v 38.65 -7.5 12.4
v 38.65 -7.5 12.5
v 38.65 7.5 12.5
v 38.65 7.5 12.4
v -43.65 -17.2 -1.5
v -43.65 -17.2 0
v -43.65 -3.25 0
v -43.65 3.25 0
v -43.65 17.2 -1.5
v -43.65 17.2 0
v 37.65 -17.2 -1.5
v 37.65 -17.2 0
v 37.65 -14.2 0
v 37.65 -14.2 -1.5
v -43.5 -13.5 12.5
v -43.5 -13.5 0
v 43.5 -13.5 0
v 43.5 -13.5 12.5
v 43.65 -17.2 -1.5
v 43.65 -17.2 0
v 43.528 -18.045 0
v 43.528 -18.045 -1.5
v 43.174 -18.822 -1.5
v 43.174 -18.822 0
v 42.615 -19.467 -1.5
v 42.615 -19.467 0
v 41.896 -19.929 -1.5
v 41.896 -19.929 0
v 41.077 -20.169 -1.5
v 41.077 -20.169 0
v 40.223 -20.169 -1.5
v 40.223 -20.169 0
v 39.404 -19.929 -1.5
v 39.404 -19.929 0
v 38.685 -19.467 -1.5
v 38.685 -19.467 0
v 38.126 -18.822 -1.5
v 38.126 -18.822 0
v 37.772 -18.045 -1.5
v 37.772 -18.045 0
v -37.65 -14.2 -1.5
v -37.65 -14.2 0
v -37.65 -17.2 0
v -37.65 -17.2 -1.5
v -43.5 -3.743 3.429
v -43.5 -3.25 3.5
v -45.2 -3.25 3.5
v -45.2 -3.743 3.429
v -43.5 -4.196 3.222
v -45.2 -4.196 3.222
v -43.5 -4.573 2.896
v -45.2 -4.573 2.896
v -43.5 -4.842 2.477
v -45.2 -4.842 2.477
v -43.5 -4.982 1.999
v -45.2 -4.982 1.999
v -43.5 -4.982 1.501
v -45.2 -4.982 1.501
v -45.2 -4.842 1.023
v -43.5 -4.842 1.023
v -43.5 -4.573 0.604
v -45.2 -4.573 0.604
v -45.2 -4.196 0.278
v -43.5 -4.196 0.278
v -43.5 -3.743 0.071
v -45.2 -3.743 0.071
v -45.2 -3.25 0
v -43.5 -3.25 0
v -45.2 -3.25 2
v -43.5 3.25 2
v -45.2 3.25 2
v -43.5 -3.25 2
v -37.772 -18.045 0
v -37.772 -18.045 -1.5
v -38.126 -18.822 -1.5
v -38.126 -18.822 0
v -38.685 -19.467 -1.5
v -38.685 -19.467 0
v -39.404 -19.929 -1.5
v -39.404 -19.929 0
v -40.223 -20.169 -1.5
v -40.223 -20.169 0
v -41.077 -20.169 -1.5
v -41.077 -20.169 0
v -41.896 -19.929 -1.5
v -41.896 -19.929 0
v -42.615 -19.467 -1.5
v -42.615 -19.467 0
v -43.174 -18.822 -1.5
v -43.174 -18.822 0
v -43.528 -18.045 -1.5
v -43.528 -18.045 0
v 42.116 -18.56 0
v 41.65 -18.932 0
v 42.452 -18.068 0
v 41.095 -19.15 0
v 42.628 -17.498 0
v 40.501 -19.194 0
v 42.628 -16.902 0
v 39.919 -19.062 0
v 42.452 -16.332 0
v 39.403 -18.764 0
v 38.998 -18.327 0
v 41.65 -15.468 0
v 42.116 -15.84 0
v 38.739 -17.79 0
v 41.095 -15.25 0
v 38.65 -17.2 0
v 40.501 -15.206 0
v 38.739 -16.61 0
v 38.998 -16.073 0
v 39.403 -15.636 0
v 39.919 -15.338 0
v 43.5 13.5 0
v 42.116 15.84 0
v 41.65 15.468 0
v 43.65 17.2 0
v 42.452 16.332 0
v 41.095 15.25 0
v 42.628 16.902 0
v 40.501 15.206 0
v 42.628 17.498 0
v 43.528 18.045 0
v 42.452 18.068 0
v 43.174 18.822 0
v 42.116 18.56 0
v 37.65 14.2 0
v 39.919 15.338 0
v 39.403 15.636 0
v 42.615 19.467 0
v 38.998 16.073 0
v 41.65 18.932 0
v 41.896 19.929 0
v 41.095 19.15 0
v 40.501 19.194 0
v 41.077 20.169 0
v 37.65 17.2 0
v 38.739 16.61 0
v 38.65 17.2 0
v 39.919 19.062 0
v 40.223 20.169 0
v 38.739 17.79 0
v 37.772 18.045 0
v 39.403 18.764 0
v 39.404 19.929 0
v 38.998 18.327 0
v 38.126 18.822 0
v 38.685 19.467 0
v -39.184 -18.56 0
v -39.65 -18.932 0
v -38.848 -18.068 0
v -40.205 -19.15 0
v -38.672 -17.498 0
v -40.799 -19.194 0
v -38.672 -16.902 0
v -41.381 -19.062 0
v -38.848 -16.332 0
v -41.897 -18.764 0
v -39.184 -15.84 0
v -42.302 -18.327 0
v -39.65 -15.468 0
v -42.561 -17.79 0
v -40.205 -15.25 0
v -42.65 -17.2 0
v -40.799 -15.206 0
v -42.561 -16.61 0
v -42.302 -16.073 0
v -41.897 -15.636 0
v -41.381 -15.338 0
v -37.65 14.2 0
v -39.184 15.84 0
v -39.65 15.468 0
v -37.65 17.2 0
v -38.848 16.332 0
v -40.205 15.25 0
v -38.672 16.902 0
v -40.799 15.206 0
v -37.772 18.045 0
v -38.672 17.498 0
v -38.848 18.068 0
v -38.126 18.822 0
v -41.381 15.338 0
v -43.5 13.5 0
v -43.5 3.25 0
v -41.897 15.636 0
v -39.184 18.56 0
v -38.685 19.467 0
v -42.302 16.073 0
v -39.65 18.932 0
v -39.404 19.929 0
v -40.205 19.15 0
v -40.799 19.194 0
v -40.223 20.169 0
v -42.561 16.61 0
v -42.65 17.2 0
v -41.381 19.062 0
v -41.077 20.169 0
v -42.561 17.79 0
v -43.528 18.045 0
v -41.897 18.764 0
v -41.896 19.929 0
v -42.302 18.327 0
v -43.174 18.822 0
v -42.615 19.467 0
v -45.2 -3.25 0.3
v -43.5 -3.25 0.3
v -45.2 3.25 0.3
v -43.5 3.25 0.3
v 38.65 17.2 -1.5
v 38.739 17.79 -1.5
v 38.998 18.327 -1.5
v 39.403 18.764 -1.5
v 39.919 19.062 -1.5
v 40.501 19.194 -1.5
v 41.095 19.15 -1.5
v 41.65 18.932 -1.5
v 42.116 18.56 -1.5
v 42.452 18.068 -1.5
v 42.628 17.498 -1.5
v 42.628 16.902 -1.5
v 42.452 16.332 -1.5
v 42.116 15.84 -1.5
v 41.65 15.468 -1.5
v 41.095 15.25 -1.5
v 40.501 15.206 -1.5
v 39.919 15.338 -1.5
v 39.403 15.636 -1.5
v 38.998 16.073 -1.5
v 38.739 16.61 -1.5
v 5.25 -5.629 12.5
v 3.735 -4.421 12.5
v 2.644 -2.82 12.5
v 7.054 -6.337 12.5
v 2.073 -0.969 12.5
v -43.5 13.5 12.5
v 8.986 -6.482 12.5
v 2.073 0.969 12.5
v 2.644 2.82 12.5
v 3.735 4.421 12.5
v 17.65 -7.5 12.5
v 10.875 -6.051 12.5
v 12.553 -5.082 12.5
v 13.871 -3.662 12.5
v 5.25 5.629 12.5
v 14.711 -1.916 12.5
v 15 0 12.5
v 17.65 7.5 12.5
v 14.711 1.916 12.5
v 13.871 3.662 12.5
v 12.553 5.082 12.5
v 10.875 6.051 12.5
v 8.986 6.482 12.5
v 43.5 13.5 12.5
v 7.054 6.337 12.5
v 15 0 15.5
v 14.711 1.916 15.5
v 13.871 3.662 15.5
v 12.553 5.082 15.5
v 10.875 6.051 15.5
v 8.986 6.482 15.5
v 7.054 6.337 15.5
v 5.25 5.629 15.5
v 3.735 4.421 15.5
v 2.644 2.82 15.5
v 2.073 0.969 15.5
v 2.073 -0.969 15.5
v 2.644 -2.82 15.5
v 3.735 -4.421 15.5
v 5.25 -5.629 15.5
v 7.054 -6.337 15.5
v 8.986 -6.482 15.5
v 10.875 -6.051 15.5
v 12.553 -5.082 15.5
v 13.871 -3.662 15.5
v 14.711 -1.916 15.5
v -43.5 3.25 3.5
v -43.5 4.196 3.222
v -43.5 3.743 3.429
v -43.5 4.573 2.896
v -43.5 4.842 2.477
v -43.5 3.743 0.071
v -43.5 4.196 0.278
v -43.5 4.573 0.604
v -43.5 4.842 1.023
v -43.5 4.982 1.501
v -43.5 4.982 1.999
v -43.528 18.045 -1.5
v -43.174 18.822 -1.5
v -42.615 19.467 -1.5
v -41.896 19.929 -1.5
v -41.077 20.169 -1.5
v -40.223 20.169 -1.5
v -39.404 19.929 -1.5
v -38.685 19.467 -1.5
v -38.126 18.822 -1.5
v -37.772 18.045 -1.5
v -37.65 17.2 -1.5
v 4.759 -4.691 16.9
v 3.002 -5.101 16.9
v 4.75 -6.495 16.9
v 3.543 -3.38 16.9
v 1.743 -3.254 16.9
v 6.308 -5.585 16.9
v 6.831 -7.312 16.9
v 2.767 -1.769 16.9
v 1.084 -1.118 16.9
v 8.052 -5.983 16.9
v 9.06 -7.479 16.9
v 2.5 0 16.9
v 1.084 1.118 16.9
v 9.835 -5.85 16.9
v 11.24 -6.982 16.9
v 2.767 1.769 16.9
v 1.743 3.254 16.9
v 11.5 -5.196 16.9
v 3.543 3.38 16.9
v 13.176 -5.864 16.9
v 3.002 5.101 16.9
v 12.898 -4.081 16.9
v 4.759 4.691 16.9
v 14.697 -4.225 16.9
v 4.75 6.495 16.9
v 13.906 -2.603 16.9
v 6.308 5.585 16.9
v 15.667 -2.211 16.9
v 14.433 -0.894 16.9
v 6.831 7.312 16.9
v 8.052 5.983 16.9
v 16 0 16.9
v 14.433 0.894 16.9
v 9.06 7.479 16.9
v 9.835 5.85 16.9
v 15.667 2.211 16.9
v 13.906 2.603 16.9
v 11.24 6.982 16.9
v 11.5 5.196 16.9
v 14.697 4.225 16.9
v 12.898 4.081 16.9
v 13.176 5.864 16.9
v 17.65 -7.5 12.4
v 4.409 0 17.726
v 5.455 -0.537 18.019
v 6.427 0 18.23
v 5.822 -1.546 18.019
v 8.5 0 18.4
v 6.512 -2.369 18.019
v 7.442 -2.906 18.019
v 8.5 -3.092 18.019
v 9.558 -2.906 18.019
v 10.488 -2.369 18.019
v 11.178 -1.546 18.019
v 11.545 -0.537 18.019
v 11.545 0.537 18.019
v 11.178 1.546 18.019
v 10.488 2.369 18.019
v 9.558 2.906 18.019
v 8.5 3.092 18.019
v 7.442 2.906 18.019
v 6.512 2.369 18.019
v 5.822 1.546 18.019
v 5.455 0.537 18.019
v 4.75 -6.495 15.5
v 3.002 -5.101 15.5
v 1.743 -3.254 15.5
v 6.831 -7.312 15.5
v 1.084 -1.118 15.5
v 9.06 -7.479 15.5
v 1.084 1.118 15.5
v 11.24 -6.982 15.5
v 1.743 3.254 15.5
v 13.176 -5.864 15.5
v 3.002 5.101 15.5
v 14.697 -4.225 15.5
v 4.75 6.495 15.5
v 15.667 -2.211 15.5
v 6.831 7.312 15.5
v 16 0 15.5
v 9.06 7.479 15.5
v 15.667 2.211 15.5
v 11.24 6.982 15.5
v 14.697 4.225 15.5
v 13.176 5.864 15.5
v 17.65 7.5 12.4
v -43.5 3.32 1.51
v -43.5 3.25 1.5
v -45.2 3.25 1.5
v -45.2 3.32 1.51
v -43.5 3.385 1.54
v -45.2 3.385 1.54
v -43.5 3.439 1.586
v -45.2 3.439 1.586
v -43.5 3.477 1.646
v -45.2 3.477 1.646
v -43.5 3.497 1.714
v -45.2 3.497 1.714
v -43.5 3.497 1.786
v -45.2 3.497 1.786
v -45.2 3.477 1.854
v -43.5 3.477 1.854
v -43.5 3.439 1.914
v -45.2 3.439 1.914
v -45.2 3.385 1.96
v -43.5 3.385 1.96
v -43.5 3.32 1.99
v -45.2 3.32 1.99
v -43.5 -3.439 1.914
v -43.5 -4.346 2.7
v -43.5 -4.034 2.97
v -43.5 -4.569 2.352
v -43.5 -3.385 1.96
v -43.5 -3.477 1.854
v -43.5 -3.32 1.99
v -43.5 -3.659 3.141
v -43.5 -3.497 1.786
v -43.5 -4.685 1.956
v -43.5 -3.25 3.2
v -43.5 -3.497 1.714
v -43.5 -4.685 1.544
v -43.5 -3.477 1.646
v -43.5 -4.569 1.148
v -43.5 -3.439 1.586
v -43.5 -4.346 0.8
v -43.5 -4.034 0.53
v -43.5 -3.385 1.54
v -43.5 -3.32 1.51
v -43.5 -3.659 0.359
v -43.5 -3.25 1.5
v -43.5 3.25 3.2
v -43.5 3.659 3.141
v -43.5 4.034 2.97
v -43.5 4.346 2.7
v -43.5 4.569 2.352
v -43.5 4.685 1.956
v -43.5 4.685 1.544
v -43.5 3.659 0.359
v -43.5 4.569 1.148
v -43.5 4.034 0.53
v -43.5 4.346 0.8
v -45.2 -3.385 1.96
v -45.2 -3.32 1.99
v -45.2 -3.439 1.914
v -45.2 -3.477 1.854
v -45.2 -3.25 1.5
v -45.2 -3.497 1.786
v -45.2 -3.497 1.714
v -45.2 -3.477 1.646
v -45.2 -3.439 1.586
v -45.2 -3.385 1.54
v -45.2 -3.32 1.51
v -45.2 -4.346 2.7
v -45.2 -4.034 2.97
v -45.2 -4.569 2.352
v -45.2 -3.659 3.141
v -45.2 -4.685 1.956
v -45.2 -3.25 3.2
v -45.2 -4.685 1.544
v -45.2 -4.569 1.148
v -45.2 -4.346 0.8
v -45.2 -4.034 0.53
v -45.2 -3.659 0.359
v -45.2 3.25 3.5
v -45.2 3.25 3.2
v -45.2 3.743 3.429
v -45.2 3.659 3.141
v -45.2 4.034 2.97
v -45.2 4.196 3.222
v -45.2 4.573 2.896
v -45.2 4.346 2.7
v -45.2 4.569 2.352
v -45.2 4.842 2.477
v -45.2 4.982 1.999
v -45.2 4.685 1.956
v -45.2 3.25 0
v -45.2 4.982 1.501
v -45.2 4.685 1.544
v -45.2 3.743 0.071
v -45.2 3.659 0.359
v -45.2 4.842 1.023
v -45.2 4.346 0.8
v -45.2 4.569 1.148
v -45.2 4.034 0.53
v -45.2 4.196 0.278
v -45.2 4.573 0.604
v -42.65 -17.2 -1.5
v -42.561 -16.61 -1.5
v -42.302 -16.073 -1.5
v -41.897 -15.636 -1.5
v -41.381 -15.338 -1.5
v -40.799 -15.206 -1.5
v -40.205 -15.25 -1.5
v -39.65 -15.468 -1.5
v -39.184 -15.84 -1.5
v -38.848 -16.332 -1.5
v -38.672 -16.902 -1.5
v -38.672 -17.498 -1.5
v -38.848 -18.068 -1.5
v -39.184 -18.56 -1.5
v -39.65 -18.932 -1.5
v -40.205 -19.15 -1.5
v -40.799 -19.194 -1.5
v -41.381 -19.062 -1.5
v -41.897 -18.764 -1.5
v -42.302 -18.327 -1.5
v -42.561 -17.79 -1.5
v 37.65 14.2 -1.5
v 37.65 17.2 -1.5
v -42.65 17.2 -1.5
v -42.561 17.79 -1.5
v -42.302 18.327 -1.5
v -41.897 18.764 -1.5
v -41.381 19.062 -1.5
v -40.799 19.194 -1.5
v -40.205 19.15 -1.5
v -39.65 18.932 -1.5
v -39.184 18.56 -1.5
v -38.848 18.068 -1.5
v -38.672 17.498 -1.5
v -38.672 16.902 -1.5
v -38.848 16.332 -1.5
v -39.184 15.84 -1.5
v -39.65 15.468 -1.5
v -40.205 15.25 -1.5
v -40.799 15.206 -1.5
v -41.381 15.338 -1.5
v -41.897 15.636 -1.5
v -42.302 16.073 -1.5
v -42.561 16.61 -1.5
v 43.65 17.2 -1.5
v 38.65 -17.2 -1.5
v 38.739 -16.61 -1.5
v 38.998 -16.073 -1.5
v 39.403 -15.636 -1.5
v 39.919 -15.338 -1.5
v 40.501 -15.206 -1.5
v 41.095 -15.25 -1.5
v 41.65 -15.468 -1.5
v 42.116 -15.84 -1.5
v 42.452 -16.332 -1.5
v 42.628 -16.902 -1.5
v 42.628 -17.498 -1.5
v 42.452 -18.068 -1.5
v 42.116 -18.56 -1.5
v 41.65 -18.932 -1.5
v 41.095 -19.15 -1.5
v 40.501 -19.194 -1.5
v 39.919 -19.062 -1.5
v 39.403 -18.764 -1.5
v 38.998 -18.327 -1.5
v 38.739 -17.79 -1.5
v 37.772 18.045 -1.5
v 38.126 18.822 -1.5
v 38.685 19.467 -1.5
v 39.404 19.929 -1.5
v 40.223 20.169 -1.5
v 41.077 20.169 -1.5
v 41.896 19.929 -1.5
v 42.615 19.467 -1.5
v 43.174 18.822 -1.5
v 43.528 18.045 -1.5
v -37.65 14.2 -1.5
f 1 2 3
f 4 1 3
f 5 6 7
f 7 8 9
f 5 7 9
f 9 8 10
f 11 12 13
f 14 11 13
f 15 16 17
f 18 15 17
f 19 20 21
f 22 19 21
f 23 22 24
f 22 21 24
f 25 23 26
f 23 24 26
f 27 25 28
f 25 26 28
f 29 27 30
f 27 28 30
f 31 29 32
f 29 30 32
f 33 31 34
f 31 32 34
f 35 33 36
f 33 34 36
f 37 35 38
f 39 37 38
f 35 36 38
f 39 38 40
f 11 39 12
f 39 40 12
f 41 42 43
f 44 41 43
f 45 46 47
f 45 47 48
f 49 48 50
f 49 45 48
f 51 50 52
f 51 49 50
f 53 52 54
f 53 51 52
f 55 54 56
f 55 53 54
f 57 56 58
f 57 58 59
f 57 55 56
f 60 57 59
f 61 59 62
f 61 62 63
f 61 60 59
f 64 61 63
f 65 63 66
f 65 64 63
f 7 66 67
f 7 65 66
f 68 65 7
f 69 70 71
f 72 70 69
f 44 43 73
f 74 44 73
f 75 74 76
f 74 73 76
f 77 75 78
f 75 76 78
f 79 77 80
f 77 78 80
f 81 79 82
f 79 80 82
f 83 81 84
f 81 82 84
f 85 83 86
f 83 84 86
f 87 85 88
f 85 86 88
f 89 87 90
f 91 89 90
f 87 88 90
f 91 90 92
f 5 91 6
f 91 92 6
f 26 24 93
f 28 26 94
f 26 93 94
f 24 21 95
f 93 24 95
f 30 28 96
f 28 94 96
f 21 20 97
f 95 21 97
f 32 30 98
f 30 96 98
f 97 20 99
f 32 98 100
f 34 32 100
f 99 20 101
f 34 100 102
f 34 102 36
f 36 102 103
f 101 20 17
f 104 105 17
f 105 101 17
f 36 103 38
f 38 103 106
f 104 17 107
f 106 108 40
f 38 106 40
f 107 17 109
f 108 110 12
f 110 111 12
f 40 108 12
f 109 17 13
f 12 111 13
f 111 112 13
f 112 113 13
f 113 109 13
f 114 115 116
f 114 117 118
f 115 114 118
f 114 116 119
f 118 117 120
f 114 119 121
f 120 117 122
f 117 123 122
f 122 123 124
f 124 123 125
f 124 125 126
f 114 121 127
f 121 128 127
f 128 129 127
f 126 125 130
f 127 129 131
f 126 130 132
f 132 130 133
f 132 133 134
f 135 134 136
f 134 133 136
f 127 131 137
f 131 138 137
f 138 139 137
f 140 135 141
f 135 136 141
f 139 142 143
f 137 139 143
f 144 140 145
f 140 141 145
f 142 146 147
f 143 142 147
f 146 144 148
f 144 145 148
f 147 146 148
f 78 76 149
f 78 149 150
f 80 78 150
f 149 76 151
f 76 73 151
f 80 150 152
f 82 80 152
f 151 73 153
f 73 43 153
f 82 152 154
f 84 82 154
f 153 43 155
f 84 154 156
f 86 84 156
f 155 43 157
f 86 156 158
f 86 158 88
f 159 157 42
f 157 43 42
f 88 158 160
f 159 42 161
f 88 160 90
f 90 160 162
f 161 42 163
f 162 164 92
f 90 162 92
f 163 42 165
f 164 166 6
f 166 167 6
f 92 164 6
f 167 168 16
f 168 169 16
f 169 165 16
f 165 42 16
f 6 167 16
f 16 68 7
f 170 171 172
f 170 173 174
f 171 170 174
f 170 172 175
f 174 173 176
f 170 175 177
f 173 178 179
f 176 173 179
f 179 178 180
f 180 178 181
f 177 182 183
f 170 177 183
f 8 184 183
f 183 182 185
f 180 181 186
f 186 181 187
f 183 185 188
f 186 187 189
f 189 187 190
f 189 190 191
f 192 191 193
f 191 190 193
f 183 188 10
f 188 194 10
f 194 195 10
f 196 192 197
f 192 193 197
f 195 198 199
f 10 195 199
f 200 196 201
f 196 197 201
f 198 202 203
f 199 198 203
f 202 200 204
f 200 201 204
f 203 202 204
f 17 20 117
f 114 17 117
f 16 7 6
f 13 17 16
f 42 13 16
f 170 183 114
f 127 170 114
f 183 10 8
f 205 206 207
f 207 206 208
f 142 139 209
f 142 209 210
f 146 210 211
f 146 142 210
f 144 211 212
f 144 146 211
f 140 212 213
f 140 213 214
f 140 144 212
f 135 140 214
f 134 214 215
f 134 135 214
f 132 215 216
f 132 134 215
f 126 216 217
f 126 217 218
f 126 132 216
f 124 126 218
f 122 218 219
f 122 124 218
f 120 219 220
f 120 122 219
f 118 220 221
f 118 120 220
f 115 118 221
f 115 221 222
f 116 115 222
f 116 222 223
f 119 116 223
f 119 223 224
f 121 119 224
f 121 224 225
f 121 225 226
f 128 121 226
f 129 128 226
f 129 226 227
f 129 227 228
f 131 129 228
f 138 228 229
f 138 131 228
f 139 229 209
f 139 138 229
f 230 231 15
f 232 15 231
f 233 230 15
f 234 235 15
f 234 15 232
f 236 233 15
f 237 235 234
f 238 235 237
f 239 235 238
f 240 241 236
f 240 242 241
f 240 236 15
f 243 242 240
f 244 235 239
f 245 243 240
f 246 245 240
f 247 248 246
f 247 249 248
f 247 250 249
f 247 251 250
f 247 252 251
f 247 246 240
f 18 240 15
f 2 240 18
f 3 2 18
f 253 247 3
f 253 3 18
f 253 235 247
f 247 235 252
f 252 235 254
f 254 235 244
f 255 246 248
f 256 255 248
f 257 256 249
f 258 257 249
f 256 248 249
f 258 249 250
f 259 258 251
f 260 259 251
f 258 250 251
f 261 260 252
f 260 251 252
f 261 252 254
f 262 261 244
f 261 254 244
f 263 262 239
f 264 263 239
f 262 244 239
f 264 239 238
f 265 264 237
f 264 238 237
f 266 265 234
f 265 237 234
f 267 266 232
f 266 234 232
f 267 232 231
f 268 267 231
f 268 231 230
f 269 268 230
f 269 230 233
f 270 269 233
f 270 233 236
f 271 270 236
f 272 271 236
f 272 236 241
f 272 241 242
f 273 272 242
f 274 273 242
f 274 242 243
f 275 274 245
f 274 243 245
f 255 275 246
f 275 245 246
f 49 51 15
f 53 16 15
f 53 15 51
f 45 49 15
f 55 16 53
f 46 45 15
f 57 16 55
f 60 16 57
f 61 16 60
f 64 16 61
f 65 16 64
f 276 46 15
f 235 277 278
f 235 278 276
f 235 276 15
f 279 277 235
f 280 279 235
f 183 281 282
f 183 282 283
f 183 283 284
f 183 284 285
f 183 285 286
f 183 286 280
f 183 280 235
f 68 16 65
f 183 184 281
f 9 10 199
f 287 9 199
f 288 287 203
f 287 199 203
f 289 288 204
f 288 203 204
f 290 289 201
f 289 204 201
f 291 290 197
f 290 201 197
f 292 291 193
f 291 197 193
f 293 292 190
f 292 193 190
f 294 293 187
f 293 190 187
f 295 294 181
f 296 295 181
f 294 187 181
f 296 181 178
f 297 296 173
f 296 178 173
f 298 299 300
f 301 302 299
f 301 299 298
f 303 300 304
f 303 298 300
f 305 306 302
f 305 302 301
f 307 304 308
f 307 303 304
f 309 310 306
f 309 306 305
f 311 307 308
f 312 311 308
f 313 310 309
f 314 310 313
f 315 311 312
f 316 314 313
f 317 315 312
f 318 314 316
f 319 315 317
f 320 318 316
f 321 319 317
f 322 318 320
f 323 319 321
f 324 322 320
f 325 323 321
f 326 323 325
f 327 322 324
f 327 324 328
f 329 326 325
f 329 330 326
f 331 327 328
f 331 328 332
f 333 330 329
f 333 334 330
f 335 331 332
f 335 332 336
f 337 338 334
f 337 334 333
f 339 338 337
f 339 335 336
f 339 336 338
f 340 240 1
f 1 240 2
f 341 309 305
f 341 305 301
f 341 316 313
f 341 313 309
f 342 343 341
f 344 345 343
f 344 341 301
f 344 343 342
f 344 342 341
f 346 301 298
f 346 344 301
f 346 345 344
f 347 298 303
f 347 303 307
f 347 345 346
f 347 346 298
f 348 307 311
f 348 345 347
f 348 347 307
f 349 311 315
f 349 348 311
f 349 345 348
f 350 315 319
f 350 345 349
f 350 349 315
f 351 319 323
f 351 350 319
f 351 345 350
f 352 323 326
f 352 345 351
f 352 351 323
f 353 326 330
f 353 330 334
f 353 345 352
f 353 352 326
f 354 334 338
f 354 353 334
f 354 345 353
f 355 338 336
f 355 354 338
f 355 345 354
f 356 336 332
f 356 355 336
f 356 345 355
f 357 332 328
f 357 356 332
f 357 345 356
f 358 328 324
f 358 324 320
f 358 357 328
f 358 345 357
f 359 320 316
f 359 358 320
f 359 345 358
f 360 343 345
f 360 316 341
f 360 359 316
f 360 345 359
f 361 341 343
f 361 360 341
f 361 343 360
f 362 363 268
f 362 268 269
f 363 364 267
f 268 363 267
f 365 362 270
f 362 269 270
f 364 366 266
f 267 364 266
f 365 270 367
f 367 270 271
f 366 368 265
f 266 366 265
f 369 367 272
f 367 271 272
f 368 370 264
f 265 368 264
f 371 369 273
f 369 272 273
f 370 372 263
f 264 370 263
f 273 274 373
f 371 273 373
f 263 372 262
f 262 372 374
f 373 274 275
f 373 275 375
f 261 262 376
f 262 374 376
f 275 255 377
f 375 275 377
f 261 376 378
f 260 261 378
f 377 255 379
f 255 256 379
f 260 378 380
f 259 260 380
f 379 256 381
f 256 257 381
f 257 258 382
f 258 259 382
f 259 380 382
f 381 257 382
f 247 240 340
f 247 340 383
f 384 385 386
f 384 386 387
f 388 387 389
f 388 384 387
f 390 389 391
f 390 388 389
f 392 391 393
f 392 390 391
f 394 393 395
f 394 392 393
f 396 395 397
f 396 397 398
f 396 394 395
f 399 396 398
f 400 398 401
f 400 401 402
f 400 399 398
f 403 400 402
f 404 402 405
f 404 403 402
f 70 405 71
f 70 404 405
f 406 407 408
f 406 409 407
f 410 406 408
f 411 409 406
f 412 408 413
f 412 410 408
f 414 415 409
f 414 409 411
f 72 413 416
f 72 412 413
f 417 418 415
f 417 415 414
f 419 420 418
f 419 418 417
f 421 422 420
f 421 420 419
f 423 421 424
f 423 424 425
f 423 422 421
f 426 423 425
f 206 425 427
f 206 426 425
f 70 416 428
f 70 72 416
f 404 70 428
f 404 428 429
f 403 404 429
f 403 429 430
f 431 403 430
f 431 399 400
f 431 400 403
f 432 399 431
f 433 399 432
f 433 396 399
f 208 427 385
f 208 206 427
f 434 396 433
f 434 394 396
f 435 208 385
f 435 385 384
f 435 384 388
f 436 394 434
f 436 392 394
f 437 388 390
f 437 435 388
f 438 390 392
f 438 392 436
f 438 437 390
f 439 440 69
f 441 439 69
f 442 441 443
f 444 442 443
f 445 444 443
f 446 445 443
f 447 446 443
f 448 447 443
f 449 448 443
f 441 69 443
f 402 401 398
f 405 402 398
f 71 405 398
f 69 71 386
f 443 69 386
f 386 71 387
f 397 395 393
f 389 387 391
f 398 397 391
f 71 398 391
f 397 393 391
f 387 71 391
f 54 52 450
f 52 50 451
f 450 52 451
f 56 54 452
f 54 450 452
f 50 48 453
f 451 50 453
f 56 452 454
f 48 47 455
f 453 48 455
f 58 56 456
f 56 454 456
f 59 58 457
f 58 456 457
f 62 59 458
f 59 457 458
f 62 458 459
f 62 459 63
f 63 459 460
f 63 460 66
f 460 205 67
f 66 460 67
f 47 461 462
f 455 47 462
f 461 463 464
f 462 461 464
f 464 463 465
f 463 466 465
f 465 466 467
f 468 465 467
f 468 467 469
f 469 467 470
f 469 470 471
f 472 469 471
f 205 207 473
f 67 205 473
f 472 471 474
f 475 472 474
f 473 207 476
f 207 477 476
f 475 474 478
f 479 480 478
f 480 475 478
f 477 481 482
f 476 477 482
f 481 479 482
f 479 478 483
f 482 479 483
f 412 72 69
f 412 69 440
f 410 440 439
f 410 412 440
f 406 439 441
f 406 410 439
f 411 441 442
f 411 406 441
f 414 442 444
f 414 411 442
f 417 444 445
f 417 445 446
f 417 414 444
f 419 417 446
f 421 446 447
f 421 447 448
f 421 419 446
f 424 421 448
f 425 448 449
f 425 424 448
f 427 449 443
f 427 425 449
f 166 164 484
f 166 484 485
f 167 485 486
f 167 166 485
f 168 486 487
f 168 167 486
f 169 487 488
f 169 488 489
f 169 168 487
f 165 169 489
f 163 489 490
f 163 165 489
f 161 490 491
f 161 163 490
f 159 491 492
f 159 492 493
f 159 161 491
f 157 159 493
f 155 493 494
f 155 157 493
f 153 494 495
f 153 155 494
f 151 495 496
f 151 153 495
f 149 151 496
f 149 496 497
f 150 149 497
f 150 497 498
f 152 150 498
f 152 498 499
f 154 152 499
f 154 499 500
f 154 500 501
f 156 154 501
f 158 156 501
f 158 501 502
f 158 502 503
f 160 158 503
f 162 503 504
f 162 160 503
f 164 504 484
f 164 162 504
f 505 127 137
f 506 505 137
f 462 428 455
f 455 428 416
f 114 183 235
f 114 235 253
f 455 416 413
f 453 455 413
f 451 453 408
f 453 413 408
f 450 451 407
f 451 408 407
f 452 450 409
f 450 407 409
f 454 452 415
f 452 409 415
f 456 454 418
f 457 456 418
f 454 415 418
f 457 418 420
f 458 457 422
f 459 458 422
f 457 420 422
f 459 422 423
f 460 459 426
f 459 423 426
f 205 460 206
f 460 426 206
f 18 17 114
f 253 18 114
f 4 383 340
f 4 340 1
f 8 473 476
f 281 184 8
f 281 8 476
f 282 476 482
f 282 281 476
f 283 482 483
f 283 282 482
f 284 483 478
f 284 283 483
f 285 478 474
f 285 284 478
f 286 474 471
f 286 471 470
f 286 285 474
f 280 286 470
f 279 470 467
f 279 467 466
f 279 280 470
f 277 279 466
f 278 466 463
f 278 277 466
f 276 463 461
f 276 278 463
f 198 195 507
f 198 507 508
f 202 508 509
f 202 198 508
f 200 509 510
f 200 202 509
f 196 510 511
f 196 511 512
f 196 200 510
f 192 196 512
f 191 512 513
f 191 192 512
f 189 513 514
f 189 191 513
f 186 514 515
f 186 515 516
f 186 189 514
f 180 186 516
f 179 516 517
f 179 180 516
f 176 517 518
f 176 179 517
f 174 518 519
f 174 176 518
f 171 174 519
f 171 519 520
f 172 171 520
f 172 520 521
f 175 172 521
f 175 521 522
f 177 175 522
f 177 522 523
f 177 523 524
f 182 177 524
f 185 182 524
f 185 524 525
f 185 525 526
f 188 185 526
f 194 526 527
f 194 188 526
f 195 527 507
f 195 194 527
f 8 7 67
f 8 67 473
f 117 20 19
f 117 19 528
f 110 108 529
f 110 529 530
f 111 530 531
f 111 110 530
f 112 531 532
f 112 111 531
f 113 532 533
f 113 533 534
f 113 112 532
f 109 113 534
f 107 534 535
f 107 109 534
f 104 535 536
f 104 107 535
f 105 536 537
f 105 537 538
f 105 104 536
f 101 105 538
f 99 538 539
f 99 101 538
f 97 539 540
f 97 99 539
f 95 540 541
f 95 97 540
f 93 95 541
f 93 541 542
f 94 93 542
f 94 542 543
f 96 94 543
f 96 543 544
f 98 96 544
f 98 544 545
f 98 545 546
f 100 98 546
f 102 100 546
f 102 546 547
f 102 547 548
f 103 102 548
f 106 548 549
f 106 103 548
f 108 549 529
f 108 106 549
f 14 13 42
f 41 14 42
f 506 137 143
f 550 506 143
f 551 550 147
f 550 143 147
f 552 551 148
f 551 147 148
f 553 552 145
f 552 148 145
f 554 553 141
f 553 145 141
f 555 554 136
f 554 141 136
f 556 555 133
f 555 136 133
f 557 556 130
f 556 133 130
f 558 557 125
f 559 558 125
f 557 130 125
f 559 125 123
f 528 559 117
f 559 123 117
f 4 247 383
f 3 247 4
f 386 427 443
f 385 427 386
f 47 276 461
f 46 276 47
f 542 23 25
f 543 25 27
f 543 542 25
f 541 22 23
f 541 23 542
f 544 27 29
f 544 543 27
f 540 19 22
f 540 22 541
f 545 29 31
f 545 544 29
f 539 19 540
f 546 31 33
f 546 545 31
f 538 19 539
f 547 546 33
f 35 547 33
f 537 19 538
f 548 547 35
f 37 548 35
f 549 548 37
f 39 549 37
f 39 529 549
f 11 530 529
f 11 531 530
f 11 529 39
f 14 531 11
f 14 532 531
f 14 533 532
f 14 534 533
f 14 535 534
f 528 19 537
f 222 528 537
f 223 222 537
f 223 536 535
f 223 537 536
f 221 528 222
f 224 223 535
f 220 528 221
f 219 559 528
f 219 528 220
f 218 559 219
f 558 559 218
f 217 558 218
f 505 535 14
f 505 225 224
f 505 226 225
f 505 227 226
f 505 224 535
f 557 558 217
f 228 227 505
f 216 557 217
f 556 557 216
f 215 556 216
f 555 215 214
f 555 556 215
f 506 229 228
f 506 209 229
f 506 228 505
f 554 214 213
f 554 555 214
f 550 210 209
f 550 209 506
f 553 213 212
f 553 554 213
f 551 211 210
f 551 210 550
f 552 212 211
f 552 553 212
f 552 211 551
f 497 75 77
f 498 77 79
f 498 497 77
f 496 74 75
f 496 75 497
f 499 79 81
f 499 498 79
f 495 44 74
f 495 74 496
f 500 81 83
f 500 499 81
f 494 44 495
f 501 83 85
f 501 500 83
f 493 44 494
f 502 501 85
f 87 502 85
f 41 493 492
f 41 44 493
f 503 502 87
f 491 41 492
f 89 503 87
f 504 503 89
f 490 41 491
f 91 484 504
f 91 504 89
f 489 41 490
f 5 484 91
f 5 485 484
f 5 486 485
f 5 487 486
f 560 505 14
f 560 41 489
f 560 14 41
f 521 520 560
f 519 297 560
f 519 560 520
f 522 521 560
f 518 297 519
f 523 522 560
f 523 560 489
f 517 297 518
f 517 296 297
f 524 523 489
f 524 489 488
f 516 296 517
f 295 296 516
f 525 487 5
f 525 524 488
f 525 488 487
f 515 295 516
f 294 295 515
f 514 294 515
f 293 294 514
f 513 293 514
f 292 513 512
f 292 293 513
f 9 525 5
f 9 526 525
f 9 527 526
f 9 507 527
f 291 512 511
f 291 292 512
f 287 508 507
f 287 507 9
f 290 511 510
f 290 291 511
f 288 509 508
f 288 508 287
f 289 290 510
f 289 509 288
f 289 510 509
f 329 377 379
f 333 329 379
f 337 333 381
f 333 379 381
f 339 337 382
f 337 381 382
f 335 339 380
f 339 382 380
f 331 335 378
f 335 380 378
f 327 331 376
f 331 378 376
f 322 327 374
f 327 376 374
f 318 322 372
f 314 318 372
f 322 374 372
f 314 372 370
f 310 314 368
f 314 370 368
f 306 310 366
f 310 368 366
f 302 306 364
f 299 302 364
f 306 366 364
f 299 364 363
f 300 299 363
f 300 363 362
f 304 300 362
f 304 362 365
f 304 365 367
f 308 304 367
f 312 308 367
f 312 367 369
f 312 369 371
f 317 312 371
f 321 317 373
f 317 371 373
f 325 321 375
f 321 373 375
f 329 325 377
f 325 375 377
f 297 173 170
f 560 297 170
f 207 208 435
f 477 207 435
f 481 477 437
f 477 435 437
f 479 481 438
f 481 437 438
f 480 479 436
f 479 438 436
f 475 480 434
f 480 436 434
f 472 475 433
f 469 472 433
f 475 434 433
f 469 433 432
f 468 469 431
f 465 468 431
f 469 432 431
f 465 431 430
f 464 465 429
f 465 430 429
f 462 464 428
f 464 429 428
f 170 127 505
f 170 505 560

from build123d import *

# Parameters (mm, degrees)
CROQUIS1_W              = 87
CROQUIS1_H              = 27
SALIENTE_EXTRUIR1_DEPTH = 12.5
CROQUIS2_R              = 2
SALIENTE_EXTRUIR3_DEPTH = 1.5
CROQUIS3_R              = 6.5
SALIENTE_EXTRUIR4_DEPTH = 3
CROQUIS4_R              = 7.5
SALIENTE_EXTRUIR5_DEPTH = 1.4
CROQUIS8_W              = 21
CROQUIS8_H              = 15
CORTAR_EXTRUIR2_DEPTH   = 0.1
SALIENTE_EXTRUIR6_DEPTH = 1.7


with BuildPart() as part:
    # Croquis1 → Saliente-Extruir1 (new body)
    with BuildSketch(Plane.XY):
        Rectangle(CROQUIS1_W, CROQUIS1_H)
    extrude(amount=SALIENTE_EXTRUIR1_DEPTH)

    # Croquis2 → Saliente-Extruir3 (add)
    with BuildSketch(Plane(origin=(0, 0, 0), x_dir=(-1, 0, 0), z_dir=(0, 0, -1))):
        with BuildLine():
            Line((43.65, -17.2), (43.65, 17.2))
            ThreePointArc((43.65, 17.2), (40.65, 20.2), (37.65, 17.2))
            Line((37.65, 17.2), (37.65, 14.2))
            Line((37.65, 14.2), (-37.65, 14.2))
            Line((-37.65, 14.2), (-37.65, 17.2))
            ThreePointArc((-37.65, 17.2), (-40.65, 20.2), (-43.65, 17.2))
            Line((-43.65, 17.2), (-43.65, -17.2))
            ThreePointArc((-43.65, -17.2), (-40.65, -20.2), (-37.65, -17.2))
            Line((-37.65, -17.2), (-37.65, -14.2))
            Line((-37.65, -14.2), (37.65, -14.2))
            Line((37.65, -14.2), (37.65, -17.2))
            ThreePointArc((37.65, -17.2), (40.65, -20.2), (43.65, -17.2))
        make_face()
        with Locations((40.65, -17.2)):
            Circle(CROQUIS2_R, mode=Mode.SUBTRACT)
        with Locations((-40.65, -17.2)):
            Circle(CROQUIS2_R, mode=Mode.SUBTRACT)
        with Locations((-40.65, 17.2)):
            Circle(CROQUIS2_R, mode=Mode.SUBTRACT)
        with Locations((40.65, 17.2)):
            Circle(CROQUIS2_R, mode=Mode.SUBTRACT)
    extrude(amount=SALIENTE_EXTRUIR3_DEPTH)

    # Croquis3 → Saliente-Extruir4 (add)
    with BuildSketch(Plane.XY.offset(12.5)):
        with Locations((8.5, 0)):
            Circle(CROQUIS3_R)
    extrude(amount=SALIENTE_EXTRUIR4_DEPTH)

    # Croquis4 → Saliente-Extruir5 (add)
    with BuildSketch(Plane.XY.offset(15.5)):
        with Locations((8.5, 0)):
            Circle(CROQUIS4_R)
    extrude(amount=SALIENTE_EXTRUIR5_DEPTH)

    # Croquis7 → Revolución3 (revolve)
    with BuildSketch(Plane(origin=(0, 0, 0), x_dir=(1, 0, 0), z_dir=(0, 1, 0))):
        with BuildLine():
            Line((14.5, -16.9), (8.5, -16.9))
            Line((8.5, -16.9), (8.5, -18.4))
            ThreePointArc((8.5, -18.4), (11.592329219, -18.019316877), (14.5, -16.9))
        make_face()
    revolve(axis=Axis((8.5, 0, 16.9), (0, 0, 1)))

    # Croquis8 → Cortar-Extruir2 (cut)
    with BuildSketch(Plane.XY.offset(12.5)):
        with Locations((28.15, 0)):
            Rectangle(CROQUIS8_W, CROQUIS8_H)
    extrude(amount=-CORTAR_EXTRUIR2_DEPTH, mode=Mode.SUBTRACT)

    # Croquis9 → Saliente-Extruir6 (add)
    # profile 1 of 2: a face of its own
    with BuildSketch(Plane.ZY.offset(43.5)):
        with BuildLine():
            Line((0, 3.25), (0, -3.25))
            ThreePointArc((0, -3.25), (1.75, -5), (3.5, -3.25))
            Line((3.5, -3.25), (3.5, 3.25))
            ThreePointArc((3.5, 3.25), (1.75, 5), (0, 3.25))
        make_face()
        with BuildLine():
            ThreePointArc((3.2, -3.25), (1.75, -4.7), (0.3, -3.25))
            Line((0.3, -3.25), (0.3, 3.25))
            ThreePointArc((0.3, 3.25), (1.75, 4.7), (3.2, 3.25))
            Line((3.2, 3.25), (3.2, -3.25))
        make_face(mode=Mode.SUBTRACT)
    # profile 2 of 2: a face of its own
    with BuildSketch(Plane.ZY.offset(43.5)):
        with BuildLine():
            Line((1.5, 3.25), (1.5, -3.25))
            ThreePointArc((1.5, -3.25), (1.75, -3.5), (2, -3.25))
            Line((2, -3.25), (2, 3.25))
            ThreePointArc((2, 3.25), (1.75, 3.5), (1.5, 3.25))
        make_face()
    extrude(amount=SALIENTE_EXTRUIR6_DEPTH)


solid = part.part
